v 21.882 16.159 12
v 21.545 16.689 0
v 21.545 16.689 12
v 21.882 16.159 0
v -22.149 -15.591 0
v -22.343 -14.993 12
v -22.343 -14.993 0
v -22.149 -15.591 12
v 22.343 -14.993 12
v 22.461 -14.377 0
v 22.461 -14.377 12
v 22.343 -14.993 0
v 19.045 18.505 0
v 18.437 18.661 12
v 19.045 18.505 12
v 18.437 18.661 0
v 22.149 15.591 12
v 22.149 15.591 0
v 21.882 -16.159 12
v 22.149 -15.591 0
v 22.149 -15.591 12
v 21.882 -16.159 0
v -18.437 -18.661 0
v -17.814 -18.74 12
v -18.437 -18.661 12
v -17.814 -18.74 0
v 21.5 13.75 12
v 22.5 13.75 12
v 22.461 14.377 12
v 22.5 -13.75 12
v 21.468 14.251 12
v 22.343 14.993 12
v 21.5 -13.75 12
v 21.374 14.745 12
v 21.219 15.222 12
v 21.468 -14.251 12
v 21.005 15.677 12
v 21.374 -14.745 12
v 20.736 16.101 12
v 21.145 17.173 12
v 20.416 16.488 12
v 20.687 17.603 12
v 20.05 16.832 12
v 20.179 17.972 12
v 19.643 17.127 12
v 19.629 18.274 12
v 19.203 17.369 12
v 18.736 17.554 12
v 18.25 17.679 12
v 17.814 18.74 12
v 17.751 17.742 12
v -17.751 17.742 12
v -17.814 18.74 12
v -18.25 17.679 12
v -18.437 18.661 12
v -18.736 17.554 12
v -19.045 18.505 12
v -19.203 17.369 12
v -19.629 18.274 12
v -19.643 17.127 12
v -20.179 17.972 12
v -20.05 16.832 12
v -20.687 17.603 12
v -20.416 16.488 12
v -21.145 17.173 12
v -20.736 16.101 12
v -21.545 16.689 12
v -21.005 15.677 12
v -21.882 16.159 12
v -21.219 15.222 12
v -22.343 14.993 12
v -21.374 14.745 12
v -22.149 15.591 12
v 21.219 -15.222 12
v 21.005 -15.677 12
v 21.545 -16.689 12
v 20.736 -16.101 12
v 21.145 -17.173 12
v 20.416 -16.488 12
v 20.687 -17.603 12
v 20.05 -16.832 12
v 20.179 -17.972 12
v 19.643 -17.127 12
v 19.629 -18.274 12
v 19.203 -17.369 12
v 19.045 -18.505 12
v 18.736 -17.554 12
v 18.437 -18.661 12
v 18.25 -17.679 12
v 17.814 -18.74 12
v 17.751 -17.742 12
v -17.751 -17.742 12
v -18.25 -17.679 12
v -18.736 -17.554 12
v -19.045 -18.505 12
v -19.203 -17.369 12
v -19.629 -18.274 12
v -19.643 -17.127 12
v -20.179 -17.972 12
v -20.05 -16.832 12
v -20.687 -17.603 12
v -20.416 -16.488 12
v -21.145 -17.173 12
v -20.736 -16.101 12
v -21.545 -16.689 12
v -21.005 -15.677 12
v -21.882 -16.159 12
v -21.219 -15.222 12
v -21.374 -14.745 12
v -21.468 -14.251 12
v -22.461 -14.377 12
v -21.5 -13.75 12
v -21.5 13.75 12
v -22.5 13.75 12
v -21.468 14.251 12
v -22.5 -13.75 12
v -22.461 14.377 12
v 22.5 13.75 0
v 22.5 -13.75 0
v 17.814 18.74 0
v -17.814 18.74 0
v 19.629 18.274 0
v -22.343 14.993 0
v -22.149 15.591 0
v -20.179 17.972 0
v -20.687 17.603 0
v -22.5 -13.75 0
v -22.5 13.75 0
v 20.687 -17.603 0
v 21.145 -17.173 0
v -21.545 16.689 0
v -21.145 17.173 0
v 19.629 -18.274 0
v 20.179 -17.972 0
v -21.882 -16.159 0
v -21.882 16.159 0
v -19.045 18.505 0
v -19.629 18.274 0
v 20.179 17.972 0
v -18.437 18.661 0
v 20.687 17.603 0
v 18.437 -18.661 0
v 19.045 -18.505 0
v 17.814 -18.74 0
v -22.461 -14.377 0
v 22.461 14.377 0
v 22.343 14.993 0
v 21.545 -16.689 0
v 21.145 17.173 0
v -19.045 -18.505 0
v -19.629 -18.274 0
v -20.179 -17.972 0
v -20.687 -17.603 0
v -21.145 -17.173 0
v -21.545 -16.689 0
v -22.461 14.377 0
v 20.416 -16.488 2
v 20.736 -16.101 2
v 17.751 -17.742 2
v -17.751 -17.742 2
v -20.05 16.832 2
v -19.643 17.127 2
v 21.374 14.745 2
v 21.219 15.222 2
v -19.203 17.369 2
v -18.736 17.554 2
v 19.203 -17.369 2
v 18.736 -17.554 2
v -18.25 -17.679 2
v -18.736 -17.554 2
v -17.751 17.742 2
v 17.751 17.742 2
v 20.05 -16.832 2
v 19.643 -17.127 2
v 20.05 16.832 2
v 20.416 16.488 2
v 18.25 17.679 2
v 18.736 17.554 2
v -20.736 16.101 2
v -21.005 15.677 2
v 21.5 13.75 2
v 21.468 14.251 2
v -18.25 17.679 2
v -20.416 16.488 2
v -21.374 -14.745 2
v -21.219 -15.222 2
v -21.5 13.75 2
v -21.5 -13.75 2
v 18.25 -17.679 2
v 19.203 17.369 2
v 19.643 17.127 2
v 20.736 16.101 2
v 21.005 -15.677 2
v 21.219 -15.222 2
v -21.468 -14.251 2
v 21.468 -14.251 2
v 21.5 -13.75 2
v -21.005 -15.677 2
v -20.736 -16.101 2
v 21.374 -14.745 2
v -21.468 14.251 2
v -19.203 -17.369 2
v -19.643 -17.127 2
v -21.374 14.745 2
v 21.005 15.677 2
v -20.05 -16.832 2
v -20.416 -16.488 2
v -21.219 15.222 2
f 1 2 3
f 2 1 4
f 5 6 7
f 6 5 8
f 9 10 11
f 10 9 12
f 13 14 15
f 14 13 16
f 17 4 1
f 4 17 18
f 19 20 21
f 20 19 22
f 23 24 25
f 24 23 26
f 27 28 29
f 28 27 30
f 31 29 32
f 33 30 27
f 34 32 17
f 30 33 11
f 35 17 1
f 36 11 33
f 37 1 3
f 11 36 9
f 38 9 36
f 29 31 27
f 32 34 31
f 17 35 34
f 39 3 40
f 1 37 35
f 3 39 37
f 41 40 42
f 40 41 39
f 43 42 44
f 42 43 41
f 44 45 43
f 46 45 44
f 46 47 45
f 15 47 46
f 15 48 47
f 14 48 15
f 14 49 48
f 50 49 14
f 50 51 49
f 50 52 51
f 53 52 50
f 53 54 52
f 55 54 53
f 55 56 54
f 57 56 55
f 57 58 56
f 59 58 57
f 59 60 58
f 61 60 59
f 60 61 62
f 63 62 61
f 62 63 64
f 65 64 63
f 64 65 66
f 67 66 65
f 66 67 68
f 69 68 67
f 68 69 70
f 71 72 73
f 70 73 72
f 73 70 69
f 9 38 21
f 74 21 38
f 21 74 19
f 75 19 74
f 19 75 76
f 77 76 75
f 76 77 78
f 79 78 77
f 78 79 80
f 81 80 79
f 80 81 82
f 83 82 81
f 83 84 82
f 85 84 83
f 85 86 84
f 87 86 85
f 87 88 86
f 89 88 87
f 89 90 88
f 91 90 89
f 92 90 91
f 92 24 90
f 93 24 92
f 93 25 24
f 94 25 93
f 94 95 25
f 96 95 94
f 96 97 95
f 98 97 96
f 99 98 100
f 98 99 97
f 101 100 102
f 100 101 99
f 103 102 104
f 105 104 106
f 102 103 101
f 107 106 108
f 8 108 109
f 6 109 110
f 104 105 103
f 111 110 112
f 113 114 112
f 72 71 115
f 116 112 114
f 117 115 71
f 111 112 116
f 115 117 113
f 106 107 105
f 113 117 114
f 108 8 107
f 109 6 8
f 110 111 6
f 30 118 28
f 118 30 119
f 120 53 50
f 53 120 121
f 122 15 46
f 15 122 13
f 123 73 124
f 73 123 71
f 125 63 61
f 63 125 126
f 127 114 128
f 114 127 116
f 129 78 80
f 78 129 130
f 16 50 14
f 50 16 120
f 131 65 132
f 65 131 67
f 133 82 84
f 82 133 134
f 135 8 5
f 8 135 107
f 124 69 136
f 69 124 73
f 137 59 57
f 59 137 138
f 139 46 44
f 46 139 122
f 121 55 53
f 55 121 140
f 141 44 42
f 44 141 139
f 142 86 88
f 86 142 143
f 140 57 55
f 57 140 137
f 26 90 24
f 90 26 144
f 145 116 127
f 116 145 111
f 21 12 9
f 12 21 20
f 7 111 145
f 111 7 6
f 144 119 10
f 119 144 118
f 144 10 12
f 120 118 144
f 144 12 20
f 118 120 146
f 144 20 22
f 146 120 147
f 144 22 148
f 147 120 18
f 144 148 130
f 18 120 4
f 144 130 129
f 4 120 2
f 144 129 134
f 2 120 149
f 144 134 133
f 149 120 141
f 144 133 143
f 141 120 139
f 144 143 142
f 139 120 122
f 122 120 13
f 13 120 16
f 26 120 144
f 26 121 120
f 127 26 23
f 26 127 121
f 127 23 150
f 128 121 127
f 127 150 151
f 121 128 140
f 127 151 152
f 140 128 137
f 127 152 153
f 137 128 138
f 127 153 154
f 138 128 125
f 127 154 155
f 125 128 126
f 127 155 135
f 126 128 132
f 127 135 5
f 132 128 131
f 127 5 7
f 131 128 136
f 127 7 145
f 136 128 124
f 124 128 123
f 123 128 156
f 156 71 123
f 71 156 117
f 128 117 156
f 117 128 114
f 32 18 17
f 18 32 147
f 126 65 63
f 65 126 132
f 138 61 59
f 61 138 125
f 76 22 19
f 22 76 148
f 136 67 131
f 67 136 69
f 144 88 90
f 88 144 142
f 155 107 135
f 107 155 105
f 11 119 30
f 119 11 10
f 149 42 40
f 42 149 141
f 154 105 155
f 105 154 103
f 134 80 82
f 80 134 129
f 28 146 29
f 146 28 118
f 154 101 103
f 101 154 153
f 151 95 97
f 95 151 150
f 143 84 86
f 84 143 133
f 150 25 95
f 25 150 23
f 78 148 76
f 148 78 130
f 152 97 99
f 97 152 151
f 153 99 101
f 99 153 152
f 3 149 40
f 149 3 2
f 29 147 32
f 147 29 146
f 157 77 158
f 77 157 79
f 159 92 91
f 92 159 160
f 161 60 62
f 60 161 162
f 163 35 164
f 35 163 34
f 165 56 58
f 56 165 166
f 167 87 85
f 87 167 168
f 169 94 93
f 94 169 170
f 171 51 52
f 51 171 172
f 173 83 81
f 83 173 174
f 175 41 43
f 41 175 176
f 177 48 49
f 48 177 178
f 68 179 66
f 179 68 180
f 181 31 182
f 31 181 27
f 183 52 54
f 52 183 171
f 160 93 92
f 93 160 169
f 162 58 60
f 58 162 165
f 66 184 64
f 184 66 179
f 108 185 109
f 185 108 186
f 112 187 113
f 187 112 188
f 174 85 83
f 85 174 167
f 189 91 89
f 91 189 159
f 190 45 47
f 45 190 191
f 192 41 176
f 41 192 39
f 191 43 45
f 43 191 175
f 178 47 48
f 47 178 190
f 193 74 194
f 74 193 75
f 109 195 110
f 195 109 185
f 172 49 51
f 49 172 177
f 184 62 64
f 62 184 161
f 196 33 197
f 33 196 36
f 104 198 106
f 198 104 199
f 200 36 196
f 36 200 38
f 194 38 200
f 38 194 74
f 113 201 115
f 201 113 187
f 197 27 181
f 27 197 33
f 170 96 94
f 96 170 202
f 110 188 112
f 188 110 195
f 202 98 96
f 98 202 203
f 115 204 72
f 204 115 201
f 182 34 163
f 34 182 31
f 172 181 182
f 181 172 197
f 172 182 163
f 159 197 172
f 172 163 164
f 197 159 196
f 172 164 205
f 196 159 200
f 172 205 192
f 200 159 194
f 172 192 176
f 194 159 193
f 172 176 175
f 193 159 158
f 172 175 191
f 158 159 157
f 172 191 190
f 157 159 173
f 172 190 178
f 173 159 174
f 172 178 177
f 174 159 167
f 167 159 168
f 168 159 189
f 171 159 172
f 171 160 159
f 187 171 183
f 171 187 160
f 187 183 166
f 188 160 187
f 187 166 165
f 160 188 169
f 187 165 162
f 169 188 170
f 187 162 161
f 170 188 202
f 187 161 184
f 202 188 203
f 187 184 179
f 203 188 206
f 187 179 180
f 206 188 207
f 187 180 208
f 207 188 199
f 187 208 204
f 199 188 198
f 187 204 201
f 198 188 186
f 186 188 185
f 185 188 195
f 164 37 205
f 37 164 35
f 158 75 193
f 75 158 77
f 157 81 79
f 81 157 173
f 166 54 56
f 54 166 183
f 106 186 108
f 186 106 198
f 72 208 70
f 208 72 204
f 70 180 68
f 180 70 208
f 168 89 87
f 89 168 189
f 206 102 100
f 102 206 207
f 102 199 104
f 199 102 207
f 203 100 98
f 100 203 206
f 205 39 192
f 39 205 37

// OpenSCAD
$fn = 50;


difference() {
	union() {
		hull() {
			translate(v = [-17.5000000000, 13.7500000000, 0]) {
				cylinder(h = 12, r = 5);
			}
			translate(v = [17.5000000000, 13.7500000000, 0]) {
				cylinder(h = 12, r = 5);
			}
			translate(v = [-17.5000000000, -13.7500000000, 0]) {
				cylinder(h = 12, r = 5);
			}
			translate(v = [17.5000000000, -13.7500000000, 0]) {
				cylinder(h = 12, r = 5);
			}
		}
	}
	union() {
		translate(v = [0, 0, 2]) {
			#hull() {
				translate(v = [-17.5000000000, 13.7500000000, 0]) {
					cylinder(h = 10, r = 4);
				}
				translate(v = [17.5000000000, 13.7500000000, 0]) {
					cylinder(h = 10, r = 4);
				}
				translate(v = [-17.5000000000, -13.7500000000, 0]) {
					cylinder(h = 10, r = 4);
				}
				translate(v = [17.5000000000, -13.7500000000, 0]) {
					cylinder(h = 10, r = 4);
				}
			}
		}
	}
}
